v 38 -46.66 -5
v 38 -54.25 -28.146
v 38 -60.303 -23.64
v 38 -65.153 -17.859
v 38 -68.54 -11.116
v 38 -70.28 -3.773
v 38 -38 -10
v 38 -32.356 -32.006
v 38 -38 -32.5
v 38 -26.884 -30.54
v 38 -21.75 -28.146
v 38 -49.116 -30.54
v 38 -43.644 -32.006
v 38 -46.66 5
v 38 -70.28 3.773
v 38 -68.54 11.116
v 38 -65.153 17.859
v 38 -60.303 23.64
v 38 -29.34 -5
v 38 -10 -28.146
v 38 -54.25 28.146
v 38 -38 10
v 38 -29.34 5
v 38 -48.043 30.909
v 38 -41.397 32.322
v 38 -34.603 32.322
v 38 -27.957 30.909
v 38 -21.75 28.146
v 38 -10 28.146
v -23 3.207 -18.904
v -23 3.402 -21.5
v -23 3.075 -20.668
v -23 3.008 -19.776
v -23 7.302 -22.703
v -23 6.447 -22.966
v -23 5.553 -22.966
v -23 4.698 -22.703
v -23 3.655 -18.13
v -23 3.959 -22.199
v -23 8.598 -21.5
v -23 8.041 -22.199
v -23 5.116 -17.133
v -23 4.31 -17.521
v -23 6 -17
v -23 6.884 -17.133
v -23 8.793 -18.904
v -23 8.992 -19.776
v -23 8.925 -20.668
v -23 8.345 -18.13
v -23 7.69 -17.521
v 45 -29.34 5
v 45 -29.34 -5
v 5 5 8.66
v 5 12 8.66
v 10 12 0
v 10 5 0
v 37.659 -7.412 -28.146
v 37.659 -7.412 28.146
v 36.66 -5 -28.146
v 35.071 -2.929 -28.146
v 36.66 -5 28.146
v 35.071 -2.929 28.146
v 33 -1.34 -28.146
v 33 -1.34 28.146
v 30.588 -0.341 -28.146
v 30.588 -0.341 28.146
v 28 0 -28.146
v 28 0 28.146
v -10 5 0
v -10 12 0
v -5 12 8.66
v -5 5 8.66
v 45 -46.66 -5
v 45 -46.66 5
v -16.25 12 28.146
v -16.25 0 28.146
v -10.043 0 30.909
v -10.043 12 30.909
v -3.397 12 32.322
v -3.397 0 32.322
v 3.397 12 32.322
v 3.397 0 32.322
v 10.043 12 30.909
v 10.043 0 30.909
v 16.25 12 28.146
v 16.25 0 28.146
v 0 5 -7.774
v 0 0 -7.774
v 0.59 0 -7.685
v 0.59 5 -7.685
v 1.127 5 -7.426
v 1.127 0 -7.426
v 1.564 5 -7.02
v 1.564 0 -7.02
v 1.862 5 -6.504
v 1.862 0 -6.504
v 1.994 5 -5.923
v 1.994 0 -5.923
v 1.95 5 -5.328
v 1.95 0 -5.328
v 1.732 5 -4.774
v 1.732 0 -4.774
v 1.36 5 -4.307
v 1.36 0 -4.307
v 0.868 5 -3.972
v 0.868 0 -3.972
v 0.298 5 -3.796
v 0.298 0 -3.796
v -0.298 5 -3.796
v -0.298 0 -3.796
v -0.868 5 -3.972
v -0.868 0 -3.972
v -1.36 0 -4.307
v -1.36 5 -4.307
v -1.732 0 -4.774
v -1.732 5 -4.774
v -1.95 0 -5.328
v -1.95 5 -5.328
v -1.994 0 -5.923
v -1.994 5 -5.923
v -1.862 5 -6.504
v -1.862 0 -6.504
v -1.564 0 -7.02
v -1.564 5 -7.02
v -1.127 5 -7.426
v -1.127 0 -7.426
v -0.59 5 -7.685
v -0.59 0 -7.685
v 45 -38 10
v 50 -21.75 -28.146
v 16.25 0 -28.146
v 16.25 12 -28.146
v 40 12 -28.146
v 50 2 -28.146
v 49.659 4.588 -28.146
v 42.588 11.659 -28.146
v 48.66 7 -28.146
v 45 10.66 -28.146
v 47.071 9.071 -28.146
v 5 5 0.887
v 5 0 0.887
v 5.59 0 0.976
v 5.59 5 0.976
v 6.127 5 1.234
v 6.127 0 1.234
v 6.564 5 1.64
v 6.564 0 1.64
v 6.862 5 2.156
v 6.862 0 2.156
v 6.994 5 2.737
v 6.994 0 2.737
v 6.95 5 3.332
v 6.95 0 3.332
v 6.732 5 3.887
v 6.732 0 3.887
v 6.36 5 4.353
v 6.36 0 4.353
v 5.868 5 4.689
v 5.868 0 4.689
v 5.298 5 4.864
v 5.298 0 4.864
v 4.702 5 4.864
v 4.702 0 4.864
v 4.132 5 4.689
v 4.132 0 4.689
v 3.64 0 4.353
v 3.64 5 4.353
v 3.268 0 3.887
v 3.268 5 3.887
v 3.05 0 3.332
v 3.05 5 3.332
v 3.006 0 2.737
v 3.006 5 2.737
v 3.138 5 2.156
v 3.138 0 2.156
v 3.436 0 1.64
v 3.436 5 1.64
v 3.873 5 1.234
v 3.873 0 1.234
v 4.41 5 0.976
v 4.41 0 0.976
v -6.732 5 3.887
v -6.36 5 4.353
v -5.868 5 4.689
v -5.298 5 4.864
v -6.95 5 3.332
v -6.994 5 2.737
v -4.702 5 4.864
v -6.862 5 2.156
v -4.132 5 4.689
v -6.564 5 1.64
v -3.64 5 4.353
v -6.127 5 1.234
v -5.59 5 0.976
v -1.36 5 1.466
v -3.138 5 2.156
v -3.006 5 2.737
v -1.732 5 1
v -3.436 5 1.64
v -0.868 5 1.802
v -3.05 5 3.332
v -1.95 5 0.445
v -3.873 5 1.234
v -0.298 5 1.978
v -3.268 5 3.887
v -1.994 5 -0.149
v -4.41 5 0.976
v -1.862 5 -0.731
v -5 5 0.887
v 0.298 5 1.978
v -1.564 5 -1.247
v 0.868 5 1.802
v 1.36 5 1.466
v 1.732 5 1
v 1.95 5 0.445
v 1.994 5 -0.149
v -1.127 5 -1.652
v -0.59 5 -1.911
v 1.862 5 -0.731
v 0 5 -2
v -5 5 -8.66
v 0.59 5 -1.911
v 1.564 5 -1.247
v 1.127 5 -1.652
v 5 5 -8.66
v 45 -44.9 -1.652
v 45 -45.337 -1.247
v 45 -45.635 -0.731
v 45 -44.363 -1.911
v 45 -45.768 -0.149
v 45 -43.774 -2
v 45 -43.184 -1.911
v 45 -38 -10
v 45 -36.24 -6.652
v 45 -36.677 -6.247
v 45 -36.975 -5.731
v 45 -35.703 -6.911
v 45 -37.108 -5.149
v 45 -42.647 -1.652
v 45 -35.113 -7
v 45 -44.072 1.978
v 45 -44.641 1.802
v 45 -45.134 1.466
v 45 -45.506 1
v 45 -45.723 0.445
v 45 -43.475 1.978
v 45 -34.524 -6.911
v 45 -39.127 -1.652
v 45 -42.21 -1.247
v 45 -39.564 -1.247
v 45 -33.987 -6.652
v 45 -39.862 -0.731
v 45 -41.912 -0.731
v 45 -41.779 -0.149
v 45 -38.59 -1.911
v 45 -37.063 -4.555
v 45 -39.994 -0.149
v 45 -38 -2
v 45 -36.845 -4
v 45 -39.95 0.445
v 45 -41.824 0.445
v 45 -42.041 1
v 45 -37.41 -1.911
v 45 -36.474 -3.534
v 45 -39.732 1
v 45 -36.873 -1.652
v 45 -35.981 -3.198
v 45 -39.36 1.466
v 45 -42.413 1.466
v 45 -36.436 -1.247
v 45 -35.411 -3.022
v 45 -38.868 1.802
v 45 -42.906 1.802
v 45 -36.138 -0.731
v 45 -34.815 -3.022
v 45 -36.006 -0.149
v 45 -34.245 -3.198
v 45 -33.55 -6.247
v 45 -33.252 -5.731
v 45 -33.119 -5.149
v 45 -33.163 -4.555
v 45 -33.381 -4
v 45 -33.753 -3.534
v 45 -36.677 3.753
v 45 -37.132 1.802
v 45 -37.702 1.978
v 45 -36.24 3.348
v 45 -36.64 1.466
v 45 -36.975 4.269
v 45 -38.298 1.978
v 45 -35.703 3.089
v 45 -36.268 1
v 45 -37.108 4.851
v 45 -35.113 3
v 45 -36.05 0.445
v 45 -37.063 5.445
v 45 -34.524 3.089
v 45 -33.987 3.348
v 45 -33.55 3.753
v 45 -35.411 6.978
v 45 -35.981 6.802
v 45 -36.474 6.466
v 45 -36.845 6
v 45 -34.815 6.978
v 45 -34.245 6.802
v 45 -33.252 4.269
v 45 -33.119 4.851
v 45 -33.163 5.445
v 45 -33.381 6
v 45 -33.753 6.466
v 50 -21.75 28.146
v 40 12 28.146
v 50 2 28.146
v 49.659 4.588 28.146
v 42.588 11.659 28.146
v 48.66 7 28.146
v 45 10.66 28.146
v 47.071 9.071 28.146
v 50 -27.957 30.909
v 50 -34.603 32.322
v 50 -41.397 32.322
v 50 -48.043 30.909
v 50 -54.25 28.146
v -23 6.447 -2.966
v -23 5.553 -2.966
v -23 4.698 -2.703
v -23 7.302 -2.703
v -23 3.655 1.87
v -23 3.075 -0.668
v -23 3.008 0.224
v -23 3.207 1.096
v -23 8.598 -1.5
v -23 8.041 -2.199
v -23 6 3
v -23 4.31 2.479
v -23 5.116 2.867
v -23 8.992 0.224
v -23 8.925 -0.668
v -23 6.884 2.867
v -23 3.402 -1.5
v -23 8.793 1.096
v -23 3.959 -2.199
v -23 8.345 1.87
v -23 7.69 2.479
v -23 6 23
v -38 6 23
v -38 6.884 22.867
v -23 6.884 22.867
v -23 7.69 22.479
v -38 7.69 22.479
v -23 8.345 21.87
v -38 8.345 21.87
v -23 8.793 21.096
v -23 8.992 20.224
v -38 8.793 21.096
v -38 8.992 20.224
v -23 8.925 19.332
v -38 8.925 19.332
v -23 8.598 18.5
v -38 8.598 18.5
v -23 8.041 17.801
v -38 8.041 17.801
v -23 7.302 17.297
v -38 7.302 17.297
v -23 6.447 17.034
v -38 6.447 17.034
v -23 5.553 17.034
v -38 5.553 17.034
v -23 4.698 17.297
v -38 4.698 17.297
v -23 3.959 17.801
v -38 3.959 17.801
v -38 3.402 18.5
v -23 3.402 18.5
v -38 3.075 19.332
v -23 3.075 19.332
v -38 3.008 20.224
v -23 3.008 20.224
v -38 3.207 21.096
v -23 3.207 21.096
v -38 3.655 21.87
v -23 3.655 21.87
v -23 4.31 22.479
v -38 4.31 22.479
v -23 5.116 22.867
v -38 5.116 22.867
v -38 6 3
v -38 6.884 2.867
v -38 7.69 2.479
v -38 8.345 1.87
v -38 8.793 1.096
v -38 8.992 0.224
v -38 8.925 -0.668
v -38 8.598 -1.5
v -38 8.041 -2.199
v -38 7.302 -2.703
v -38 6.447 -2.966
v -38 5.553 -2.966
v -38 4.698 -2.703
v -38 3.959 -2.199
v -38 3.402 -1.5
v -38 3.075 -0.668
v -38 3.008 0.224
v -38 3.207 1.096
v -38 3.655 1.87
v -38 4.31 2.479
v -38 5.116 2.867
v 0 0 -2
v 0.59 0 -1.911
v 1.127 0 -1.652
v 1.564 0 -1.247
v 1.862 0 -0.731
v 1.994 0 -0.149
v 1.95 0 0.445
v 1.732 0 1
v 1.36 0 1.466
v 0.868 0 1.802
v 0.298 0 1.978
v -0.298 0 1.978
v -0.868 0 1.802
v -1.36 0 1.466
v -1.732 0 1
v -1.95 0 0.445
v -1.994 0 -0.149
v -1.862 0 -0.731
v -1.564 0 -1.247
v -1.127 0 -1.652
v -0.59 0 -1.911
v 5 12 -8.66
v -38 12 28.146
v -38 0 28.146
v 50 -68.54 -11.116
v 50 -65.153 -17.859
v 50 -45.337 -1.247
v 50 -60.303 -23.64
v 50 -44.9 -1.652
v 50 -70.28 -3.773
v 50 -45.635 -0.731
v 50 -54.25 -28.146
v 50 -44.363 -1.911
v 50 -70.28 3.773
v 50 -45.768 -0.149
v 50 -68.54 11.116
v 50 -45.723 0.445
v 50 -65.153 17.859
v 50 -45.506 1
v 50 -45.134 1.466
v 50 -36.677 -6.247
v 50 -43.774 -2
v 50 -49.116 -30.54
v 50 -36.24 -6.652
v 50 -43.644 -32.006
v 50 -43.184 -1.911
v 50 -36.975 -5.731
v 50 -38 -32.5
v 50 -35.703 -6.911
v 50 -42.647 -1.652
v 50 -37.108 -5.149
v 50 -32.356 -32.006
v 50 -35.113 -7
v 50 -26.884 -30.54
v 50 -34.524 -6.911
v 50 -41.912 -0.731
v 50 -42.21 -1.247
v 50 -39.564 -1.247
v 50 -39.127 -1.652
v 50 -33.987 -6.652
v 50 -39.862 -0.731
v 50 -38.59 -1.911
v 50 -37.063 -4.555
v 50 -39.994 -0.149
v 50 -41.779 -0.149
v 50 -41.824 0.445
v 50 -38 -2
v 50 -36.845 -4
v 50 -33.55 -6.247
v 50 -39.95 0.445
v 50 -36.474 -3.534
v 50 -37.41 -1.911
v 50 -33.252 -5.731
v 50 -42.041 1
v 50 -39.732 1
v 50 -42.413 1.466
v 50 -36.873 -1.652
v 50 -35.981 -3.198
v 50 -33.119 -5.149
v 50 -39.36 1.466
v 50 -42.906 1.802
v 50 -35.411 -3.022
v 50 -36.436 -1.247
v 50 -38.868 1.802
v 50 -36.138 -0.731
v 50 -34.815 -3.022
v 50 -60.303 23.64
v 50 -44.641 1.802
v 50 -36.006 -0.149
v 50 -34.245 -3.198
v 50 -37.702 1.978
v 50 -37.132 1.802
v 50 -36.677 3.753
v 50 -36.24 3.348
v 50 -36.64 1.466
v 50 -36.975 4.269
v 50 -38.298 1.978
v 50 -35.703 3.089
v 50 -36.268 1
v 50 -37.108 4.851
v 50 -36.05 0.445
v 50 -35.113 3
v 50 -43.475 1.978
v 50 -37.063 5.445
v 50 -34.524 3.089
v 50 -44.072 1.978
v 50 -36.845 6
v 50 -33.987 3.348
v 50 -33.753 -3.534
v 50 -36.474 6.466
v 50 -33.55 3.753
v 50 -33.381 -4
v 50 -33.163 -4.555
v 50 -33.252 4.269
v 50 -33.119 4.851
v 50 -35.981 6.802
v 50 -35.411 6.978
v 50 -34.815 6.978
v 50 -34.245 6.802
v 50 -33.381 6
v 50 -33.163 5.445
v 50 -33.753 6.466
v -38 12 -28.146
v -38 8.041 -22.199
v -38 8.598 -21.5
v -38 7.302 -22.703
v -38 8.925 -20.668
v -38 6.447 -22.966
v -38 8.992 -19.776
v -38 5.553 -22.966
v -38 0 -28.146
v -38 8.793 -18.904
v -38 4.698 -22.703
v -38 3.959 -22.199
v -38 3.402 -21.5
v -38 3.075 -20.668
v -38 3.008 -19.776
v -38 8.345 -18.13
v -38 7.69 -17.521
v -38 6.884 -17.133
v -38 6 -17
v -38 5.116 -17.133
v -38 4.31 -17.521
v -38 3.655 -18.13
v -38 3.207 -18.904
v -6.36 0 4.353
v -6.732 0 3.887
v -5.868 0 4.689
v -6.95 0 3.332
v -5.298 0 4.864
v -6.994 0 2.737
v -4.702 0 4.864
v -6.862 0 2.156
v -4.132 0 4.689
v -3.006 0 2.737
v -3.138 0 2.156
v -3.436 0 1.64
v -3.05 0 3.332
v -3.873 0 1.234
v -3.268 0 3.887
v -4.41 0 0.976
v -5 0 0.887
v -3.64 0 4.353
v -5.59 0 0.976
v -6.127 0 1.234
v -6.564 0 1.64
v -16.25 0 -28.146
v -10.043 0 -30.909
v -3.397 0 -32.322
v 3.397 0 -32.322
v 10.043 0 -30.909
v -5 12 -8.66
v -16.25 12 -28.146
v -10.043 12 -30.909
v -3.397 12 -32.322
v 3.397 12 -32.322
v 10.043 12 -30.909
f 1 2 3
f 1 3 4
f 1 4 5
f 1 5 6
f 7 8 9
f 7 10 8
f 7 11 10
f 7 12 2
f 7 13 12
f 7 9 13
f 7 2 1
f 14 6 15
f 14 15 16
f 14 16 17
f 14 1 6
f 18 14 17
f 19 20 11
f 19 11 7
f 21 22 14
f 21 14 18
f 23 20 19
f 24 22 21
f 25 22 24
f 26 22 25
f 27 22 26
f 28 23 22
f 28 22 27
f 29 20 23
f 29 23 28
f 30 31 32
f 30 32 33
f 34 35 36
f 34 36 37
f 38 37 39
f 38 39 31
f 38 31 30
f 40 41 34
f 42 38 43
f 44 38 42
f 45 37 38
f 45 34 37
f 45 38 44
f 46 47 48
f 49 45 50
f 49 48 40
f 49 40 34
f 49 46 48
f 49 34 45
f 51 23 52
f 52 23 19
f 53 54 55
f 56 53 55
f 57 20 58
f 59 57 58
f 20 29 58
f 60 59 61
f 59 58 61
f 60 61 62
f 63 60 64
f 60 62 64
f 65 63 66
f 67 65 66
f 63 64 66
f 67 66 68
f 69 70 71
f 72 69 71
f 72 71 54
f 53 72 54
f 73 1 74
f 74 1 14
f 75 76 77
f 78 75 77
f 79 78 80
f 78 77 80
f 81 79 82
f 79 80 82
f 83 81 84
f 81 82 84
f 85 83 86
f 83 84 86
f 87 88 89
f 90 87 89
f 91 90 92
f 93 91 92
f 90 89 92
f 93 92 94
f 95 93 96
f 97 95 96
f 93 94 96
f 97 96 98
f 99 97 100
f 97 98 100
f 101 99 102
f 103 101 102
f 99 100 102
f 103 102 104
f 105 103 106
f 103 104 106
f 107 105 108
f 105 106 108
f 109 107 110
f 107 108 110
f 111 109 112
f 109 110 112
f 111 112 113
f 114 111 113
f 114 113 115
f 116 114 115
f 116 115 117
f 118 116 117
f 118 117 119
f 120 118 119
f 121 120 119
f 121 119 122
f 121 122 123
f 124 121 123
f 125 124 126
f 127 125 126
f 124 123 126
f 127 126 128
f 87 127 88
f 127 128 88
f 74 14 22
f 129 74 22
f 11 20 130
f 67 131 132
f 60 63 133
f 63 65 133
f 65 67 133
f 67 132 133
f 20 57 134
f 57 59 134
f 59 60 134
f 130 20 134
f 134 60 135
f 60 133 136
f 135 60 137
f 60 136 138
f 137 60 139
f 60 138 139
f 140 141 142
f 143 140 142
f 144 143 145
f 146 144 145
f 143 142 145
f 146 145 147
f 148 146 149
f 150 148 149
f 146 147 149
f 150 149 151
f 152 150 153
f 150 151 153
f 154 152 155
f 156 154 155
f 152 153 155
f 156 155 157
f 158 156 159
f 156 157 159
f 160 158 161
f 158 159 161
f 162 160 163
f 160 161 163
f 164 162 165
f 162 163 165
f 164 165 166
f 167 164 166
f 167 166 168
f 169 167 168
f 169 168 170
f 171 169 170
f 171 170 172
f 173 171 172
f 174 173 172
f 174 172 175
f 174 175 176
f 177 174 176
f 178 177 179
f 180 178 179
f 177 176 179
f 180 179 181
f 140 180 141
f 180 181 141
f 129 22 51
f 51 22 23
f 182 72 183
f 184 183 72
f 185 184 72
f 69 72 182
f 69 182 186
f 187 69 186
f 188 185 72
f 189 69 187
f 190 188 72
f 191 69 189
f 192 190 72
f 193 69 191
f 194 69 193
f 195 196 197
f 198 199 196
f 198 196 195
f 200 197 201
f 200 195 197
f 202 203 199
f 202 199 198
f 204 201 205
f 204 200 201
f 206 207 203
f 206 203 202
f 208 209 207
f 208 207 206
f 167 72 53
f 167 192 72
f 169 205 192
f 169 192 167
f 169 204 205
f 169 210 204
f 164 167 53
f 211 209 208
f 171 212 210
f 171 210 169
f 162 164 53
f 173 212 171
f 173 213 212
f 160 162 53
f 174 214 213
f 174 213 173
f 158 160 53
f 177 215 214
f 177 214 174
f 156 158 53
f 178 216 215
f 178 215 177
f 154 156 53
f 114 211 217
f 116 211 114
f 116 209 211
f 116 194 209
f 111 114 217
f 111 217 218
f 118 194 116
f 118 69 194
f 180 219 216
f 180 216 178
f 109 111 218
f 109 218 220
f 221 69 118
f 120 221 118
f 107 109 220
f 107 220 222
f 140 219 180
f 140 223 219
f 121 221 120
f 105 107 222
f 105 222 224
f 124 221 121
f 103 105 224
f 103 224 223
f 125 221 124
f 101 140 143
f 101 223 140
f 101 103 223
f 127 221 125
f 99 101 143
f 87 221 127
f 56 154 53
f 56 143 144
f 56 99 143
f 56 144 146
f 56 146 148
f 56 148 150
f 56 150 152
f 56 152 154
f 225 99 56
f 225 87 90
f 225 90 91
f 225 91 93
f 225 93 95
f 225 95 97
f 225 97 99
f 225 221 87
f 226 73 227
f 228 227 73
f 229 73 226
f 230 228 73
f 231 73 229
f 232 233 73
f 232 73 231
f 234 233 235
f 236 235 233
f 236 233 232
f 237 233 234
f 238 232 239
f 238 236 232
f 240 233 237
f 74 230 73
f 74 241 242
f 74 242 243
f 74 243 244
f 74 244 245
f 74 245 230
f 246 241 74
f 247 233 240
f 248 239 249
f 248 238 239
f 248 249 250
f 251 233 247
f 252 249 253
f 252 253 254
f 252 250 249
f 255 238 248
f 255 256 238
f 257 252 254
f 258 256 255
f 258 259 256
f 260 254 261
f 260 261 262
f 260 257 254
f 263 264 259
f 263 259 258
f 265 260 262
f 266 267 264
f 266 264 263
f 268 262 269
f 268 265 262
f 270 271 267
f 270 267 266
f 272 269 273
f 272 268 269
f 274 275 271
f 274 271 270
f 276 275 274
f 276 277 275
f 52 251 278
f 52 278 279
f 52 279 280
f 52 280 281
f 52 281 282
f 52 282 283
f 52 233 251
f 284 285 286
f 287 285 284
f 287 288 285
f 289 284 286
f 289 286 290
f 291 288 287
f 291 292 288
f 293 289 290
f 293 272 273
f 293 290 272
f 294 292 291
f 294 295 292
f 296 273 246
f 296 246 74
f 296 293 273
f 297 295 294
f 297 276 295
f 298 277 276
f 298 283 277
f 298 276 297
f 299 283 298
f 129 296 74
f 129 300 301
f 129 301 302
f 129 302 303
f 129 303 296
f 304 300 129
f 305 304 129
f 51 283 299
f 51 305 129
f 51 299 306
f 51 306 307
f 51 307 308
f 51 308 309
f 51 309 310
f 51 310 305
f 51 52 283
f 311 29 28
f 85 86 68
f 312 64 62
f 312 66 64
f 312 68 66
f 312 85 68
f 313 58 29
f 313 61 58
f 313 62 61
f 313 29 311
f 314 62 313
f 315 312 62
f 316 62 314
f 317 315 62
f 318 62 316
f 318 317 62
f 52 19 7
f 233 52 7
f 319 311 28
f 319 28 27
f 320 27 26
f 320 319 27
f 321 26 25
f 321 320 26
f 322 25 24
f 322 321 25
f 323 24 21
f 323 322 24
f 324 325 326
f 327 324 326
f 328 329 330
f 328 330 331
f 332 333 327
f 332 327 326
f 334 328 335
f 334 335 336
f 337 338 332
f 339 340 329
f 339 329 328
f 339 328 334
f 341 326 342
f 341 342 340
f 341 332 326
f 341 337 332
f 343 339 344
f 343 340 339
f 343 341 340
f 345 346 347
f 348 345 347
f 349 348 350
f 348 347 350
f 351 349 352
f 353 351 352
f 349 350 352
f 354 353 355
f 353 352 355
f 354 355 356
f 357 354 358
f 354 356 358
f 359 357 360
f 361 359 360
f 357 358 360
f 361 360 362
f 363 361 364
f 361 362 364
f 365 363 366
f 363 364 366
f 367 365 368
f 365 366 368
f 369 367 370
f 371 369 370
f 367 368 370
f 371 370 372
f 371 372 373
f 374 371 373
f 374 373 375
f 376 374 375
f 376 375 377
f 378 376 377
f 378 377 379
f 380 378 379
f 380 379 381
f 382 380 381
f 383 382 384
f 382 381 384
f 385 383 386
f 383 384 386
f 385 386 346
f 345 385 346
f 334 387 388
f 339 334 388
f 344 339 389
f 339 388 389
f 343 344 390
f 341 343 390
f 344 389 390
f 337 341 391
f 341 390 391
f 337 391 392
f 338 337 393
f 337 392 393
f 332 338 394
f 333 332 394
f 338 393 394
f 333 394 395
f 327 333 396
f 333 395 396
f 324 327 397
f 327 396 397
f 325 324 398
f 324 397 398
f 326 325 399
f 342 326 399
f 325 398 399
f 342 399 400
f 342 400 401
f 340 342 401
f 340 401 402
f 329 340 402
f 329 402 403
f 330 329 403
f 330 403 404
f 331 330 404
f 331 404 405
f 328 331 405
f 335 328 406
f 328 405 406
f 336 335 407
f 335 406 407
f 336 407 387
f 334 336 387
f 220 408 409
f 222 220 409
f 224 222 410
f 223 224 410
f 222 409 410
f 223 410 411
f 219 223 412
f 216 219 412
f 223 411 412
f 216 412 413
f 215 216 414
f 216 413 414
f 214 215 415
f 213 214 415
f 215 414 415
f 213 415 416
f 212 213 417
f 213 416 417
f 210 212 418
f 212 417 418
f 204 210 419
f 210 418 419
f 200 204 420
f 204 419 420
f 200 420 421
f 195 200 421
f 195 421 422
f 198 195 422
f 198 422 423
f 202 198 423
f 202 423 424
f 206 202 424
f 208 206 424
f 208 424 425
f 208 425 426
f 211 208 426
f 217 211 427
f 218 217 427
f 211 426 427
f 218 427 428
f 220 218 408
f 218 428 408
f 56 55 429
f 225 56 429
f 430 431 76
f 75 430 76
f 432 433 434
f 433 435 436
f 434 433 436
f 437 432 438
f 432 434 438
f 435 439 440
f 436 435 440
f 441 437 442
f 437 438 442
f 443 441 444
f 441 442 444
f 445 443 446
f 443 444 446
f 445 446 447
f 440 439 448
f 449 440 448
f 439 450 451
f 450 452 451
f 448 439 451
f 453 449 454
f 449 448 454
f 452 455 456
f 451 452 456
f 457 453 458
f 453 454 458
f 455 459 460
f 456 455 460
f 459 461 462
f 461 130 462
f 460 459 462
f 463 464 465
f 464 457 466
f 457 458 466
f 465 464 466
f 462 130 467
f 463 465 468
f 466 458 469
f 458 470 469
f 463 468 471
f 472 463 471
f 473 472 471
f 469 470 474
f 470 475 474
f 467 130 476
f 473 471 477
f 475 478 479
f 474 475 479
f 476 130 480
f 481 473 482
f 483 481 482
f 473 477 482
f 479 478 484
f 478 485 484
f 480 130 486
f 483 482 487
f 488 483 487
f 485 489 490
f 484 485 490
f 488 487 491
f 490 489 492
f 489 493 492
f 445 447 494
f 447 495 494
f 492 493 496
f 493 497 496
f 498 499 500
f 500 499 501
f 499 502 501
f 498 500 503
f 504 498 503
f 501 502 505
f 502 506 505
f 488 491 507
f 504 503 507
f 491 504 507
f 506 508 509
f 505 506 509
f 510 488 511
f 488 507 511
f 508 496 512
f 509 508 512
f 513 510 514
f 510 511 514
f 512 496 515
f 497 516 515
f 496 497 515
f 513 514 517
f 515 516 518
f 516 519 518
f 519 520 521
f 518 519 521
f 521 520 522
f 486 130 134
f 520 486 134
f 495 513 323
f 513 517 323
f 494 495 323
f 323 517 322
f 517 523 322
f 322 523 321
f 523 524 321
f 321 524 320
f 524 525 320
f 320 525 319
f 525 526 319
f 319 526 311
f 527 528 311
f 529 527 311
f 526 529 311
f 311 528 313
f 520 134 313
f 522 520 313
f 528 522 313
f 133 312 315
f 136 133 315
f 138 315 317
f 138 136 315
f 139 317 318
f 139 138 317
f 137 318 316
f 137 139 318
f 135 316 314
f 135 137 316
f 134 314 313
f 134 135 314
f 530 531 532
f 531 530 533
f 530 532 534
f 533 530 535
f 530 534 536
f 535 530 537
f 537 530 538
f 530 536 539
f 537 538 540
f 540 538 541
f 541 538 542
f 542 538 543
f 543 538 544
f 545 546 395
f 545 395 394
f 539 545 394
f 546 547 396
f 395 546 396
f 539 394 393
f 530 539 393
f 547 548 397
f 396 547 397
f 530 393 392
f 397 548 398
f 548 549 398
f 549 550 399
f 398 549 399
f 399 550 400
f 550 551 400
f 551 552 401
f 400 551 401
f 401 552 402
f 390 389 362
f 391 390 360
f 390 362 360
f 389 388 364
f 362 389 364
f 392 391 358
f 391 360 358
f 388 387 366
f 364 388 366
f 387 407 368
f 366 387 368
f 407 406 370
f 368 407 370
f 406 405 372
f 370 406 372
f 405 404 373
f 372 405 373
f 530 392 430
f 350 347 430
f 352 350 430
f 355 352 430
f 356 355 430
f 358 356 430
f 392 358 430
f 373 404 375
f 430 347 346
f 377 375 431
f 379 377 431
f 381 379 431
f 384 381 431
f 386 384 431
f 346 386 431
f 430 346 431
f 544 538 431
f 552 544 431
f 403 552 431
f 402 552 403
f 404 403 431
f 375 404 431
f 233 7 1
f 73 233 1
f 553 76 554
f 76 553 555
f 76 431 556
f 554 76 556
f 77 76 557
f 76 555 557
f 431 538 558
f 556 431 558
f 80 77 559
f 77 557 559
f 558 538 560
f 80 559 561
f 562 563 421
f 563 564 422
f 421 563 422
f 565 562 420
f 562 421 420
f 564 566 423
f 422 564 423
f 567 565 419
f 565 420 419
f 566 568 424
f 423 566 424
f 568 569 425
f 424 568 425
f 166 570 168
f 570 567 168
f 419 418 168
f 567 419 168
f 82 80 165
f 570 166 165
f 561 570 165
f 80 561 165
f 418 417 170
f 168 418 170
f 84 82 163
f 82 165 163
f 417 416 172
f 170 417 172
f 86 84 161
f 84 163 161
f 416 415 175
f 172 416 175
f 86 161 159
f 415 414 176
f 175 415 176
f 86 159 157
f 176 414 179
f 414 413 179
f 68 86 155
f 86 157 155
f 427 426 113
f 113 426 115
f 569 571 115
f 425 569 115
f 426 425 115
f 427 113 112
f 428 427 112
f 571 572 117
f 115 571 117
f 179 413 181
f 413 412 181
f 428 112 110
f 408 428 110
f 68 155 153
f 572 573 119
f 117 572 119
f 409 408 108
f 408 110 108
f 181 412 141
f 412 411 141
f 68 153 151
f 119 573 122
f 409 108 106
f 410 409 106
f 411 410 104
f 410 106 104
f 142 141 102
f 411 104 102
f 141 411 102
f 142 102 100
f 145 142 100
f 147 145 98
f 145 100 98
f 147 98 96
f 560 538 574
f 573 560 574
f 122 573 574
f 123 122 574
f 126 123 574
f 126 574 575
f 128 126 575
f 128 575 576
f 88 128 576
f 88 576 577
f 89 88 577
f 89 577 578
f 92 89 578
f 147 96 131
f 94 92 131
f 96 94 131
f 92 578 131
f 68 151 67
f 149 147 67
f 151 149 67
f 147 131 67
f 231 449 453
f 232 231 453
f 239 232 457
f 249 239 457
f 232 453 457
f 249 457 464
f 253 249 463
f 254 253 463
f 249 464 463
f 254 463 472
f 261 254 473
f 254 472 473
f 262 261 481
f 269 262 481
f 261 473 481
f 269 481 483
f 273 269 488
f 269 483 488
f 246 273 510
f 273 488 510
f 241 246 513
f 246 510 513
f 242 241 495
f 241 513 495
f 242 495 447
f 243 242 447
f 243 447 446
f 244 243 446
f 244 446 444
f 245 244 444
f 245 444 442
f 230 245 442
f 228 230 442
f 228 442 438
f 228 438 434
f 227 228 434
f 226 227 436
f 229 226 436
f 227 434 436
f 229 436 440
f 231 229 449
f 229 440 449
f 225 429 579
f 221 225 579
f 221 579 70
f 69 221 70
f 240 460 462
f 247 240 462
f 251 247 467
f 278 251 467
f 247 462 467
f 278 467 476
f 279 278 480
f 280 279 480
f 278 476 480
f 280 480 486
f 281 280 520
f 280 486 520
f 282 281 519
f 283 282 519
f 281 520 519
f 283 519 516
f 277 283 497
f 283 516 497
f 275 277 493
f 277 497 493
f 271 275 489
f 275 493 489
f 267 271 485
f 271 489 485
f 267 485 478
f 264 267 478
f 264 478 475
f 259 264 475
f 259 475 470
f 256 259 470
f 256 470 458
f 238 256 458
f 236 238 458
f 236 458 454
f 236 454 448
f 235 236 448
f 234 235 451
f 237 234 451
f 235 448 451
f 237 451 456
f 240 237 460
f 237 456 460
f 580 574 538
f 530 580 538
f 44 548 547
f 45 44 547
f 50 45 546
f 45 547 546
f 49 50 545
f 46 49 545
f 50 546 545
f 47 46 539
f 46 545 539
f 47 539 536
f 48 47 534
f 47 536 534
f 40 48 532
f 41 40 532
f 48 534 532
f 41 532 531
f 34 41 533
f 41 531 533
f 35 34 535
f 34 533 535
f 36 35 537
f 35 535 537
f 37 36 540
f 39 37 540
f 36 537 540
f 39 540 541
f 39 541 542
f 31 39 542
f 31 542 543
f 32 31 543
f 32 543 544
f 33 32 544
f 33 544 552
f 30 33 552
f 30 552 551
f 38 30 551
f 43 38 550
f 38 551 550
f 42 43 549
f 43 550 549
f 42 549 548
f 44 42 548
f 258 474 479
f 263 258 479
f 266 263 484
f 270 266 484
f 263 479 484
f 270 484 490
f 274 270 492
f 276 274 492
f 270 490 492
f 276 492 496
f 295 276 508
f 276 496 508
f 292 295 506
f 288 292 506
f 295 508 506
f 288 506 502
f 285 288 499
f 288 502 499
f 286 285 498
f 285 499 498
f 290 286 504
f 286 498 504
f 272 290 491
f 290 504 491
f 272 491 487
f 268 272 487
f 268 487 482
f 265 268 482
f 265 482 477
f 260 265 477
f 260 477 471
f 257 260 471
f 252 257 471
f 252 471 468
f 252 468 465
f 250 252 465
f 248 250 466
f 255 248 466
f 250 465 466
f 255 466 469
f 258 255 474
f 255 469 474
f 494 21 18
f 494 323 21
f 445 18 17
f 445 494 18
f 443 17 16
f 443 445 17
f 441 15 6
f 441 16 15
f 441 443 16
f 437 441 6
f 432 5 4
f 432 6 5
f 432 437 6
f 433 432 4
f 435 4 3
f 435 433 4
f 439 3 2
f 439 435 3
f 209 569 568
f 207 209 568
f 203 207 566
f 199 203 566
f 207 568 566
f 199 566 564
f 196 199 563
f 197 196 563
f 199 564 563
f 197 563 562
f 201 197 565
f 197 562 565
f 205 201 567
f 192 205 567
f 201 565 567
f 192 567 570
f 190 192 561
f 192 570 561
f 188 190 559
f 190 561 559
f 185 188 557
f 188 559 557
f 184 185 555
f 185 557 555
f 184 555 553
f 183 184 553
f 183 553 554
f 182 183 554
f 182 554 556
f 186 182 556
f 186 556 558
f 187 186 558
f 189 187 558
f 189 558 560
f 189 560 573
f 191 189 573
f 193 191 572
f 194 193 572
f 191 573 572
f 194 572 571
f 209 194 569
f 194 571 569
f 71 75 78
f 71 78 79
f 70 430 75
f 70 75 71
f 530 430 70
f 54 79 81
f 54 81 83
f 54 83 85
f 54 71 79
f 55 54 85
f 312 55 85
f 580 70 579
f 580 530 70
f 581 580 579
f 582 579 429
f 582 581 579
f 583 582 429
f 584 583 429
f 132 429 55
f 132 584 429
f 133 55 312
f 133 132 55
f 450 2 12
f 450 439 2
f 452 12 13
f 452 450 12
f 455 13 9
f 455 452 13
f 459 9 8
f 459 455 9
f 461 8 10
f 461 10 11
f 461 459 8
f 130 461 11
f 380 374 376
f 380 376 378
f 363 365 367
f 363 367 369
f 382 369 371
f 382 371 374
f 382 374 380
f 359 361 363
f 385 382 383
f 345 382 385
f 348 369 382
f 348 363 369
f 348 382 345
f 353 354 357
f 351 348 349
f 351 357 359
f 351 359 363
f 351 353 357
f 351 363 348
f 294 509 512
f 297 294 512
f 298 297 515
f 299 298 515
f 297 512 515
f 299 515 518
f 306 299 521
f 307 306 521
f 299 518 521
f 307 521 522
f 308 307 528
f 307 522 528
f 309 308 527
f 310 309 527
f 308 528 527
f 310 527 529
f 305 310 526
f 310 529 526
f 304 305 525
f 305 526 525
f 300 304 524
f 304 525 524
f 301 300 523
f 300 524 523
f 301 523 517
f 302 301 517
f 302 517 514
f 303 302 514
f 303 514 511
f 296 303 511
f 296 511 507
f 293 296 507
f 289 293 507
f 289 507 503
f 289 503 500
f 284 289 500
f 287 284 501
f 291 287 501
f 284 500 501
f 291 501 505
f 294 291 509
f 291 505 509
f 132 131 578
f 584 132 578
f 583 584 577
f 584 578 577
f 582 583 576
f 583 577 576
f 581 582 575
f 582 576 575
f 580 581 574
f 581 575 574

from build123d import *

# Parameters (mm, degrees)
EXTRUDE_1_DEPTH      = 12
CUT_EXTRUDE_2_DEPTH  = 7
SKETCH_4_W           = 12
SKETCH_4_H           = 56.291651246
EXTRUDE_2_DEPTH      = 85
EXTRUDE_3_DEPTH      = 12
CUT_EXTRUDE_4_DEPTH  = 12
FILLET_1_R           = 10
FILLET_2_R           = 10
SKETCH_8_R           = 2
CUT_EXTRUDE_9_DEPTH  = 5
CUT_EXTRUDE_7_DEPTH  = 7
SKETCH_3_R           = 2
CUT_EXTRUDE_8_DEPTH  = 5
EXTRUDE_START        = -12
EXTRUDE_5_DEPTH      = 12
SKETCH_13_R          = 3
CUT_EXTRUDE_11_DEPTH = 15


with BuildPart() as part:
    # 草图1 → 凸台-拉伸1 (new body)
    with BuildSketch(Plane(origin=(0, 0, 0), x_dir=(1, 0, 0), z_dir=(0, 1, 0))):
        with BuildLine():
            Line((16.25, -28.145825623), (0, 0))
            Line((0, 0), (16.25, 28.145825623))
            ThreePointArc((16.25, 28.145825623), (-32.5, 0), (16.25, -28.145825623))
        make_face()
        with BuildLine():
            Line((32.5, 0), (0, 0))
            Line((0, 0), (16.25, -28.145825623))
            ThreePointArc((16.25, -28.145825623), (28.145825623, -16.25), (32.5, 0))
        make_face()
        with BuildLine():
            Line((16.25, 28.145825623), (0, 0))
            Line((0, 0), (32.5, 0))
            ThreePointArc((32.5, 0), (28.145825623, 16.25), (16.25, 28.145825623))
        make_face()
        with BuildLine():
            ThreePointArc((16.25, 28.145825623), (28.145825623, 16.25), (32.5, 0))
            Line((32.5, 0), (50, 0))
            Line((50, 0), (50, 28.145825623))
            Line((50, 28.145825623), (16.25, 28.145825623))
        make_face()
        with BuildLine():
            Line((50, 0), (32.5, 0))
            ThreePointArc((32.5, 0), (28.145825623, -16.25), (16.25, -28.145825623))
            Line((16.25, -28.145825623), (50, -28.145825623))
            Line((50, -28.145825623), (50, 0))
        make_face()
    extrude(amount=EXTRUDE_1_DEPTH)

    # 草图2 → 切除-拉伸2 (cut)
    with BuildSketch(Plane(origin=(0, 12, 0), x_dir=(1, 0, 0), z_dir=(0, 1, 0))):
        Polygon((5, -8.660254038), (10, 0), (5, 8.660254038), (-5, 8.660254038), (-10, 0), (-5, -8.660254038), align=None)
    extrude(amount=-CUT_EXTRUDE_2_DEPTH, mode=Mode.SUBTRACT)

    # 草图4 → 凸台-拉伸2 (add)
    with BuildSketch(Plane.XZ):
        with Locations((44, 0)):
            Rectangle(SKETCH_4_W, SKETCH_4_H)
    extrude(amount=EXTRUDE_2_DEPTH)

    # 草图6 → 凸台-拉伸3 (add)
    with BuildSketch(Plane(origin=(50, 0, 0), x_dir=(0, 0, -1), z_dir=(1, 0, 0))):
        with BuildLine():
            ThreePointArc((-28.145825623, -21.75), (-32.5, -38), (-28.145825623, -54.25))
            Line((-28.145825623, -54.25), (-28.145825623, -21.75))
        make_face()
        with BuildLine():
            ThreePointArc((28.145825623, -54.25), (31.392589354, -46.411618966), (32.5, -38))
            ThreePointArc((32.5, -38), (31.392589354, -29.588381034), (28.145825623, -21.75))
            Line((28.145825623, -21.75), (28.145825623, -54.25))
        make_face()
    extrude(amount=-EXTRUDE_3_DEPTH)

    # 草图7 → 切除-拉伸4 (cut)
    with BuildSketch(Plane(origin=(50, 0, 0), x_dir=(0, 0, -1), z_dir=(1, 0, 0))):
        with BuildLine():
            Line((28.145825623, -85), (28.145825623, -54.25))
            ThreePointArc((28.145825623, -54.25), (0, -70.5), (-28.145825623, -54.25))
            Line((-28.145825623, -54.25), (-28.145825623, -85))
            Line((-28.145825623, -85), (28.145825623, -85))
        make_face()
    extrude(amount=-CUT_EXTRUDE_4_DEPTH, mode=Mode.SUBTRACT)

    # 圆角1
    fillet_1_edges = [part.edges().sort_by_distance(p)[0] for p in [
        (38, 0, 0),
    ]]
    fillet(fillet_1_edges, radius=FILLET_1_R)

    # 圆角2
    fillet_2_edges = [part.edges().sort_by_distance(p)[0] for p in [
        (50, 12, 0),
    ]]
    fillet(fillet_2_edges, radius=FILLET_2_R)

    # 草图8 → 切除-拉伸9 (cut)
    with BuildSketch(Plane(origin=(50, 0, 0), x_dir=(0, 0, -1), z_dir=(1, 0, 0))):
        with Locations((0, -38)):
            Circle(SKETCH_8_R)
        with Locations((0, -43.773502692)):
            Circle(SKETCH_8_R)
        with Locations((5, -35.113248654)):
            Circle(SKETCH_8_R)
        with Locations((-5, -35.113248654)):
            Circle(SKETCH_8_R)
    extrude(amount=-CUT_EXTRUDE_9_DEPTH, mode=Mode.SUBTRACT)

    # 草图10 → 切除-拉伸7 (cut)
    with BuildSketch(Plane.ZY.offset(-38)):
        Polygon((10, -38), (5, -29.339745962), (-5, -29.339745962), (-10, -38), (-5, -46.660254038), (5, -46.660254038), align=None)
    extrude(amount=-CUT_EXTRUDE_7_DEPTH, mode=Mode.SUBTRACT)

    # 草图3 → 切除-拉伸8 (cut)
    with BuildSketch(Plane.XZ):
        with Locations(Location((0, 0, 0), (0, 0, 270))):
            Circle(SKETCH_3_R)
        with Locations(Location((0, -5.773502692, 0), (0, 0, 270))):
            Circle(SKETCH_3_R)
        with Locations(Location((5, 2.886751346, 0), (0, 0, 270))):
            Circle(SKETCH_3_R)
        with Locations(Location((-5, 2.886751346, 0), (0, 0, 270))):
            Circle(SKETCH_3_R)
    extrude(amount=-CUT_EXTRUDE_8_DEPTH, mode=Mode.SUBTRACT)

    # 草图12 → 凸台-拉伸5 (add)
    with BuildSketch(Plane(origin=(0, 12, 0), x_dir=(1, 0, 0), z_dir=(0, 1, 0)).offset(EXTRUDE_START)):
        with BuildLine():
            ThreePointArc((-16.25, -28.145825623), (-28.145825623, -16.25), (-32.5, 0))
            Line((-32.5, 0), (-38, 0))
            Line((-38, 0), (-38, -28.145825623))
            Line((-38, -28.145825623), (-16.25, -28.145825623))
        make_face()
        with BuildLine():
            Line((-38, 0), (-32.5, 0))
            ThreePointArc((-32.5, 0), (-28.145825623, 16.25), (-16.25, 28.145825623))
            Line((-16.25, 28.145825623), (-38, 28.145825623))
            Line((-38, 28.145825623), (-38, 0))
        make_face()
    extrude(amount=EXTRUDE_5_DEPTH)

    # 草图13 → 切除-拉伸11 (cut)
    with BuildSketch(Plane.ZY.offset(38)):
        with Locations((-20, 6)):
            Circle(SKETCH_13_R)
        with Locations((20, 6)):
            Circle(SKETCH_13_R)
        with Locations((0, 6)):
            Circle(SKETCH_13_R)
    extrude(amount=-CUT_EXTRUDE_11_DEPTH, mode=Mode.SUBTRACT)


solid = part.part
